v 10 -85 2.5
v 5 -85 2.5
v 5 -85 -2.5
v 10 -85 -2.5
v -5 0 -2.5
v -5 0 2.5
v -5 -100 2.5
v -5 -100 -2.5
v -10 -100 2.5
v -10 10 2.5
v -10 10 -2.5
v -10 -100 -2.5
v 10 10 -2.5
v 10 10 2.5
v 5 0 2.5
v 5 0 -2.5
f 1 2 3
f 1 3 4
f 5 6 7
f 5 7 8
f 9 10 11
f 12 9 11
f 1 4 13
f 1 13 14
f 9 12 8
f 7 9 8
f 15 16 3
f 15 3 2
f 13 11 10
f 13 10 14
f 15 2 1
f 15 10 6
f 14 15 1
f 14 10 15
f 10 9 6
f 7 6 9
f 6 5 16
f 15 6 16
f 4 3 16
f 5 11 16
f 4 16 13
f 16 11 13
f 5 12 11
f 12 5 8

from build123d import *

# Parameters (mm, degrees)
SKETCH2_W           = 20
SKETCH2_H           = 5
BOSS_EXTRUDE1_DEPTH = 10
SKETCH5_W           = 5
SKETCH5_H           = 5
BOSS_EXTRUDE2_DEPTH = 100
SKETCH6_W           = 5
SKETCH6_H           = 5
BOSS_EXTRUDE3_DEPTH = 85


with BuildPart() as part:
    # Sketch2 → Boss-Extrude1 (new body)
    with BuildSketch(Plane(origin=(0, 0, 0), x_dir=(1, 0, 0), z_dir=(0, 1, 0))):
        Rectangle(SKETCH2_W, SKETCH2_H)
    extrude(amount=BOSS_EXTRUDE1_DEPTH)

    # Sketch5 → Boss-Extrude2 (add)
    with BuildSketch(Plane(origin=(0, 0, 0), x_dir=(1, 0, 0), z_dir=(0, 1, 0))):
        with Locations((-7.5, 0)):
            Rectangle(SKETCH5_W, SKETCH5_H)
    extrude(amount=-BOSS_EXTRUDE2_DEPTH)

    # Sketch6 → Boss-Extrude3 (add)
    with BuildSketch(Plane.XZ):
        with Locations((7.5, 0)):
            Rectangle(SKETCH6_W, SKETCH6_H)
    extrude(amount=BOSS_EXTRUDE3_DEPTH)


solid = part.part
